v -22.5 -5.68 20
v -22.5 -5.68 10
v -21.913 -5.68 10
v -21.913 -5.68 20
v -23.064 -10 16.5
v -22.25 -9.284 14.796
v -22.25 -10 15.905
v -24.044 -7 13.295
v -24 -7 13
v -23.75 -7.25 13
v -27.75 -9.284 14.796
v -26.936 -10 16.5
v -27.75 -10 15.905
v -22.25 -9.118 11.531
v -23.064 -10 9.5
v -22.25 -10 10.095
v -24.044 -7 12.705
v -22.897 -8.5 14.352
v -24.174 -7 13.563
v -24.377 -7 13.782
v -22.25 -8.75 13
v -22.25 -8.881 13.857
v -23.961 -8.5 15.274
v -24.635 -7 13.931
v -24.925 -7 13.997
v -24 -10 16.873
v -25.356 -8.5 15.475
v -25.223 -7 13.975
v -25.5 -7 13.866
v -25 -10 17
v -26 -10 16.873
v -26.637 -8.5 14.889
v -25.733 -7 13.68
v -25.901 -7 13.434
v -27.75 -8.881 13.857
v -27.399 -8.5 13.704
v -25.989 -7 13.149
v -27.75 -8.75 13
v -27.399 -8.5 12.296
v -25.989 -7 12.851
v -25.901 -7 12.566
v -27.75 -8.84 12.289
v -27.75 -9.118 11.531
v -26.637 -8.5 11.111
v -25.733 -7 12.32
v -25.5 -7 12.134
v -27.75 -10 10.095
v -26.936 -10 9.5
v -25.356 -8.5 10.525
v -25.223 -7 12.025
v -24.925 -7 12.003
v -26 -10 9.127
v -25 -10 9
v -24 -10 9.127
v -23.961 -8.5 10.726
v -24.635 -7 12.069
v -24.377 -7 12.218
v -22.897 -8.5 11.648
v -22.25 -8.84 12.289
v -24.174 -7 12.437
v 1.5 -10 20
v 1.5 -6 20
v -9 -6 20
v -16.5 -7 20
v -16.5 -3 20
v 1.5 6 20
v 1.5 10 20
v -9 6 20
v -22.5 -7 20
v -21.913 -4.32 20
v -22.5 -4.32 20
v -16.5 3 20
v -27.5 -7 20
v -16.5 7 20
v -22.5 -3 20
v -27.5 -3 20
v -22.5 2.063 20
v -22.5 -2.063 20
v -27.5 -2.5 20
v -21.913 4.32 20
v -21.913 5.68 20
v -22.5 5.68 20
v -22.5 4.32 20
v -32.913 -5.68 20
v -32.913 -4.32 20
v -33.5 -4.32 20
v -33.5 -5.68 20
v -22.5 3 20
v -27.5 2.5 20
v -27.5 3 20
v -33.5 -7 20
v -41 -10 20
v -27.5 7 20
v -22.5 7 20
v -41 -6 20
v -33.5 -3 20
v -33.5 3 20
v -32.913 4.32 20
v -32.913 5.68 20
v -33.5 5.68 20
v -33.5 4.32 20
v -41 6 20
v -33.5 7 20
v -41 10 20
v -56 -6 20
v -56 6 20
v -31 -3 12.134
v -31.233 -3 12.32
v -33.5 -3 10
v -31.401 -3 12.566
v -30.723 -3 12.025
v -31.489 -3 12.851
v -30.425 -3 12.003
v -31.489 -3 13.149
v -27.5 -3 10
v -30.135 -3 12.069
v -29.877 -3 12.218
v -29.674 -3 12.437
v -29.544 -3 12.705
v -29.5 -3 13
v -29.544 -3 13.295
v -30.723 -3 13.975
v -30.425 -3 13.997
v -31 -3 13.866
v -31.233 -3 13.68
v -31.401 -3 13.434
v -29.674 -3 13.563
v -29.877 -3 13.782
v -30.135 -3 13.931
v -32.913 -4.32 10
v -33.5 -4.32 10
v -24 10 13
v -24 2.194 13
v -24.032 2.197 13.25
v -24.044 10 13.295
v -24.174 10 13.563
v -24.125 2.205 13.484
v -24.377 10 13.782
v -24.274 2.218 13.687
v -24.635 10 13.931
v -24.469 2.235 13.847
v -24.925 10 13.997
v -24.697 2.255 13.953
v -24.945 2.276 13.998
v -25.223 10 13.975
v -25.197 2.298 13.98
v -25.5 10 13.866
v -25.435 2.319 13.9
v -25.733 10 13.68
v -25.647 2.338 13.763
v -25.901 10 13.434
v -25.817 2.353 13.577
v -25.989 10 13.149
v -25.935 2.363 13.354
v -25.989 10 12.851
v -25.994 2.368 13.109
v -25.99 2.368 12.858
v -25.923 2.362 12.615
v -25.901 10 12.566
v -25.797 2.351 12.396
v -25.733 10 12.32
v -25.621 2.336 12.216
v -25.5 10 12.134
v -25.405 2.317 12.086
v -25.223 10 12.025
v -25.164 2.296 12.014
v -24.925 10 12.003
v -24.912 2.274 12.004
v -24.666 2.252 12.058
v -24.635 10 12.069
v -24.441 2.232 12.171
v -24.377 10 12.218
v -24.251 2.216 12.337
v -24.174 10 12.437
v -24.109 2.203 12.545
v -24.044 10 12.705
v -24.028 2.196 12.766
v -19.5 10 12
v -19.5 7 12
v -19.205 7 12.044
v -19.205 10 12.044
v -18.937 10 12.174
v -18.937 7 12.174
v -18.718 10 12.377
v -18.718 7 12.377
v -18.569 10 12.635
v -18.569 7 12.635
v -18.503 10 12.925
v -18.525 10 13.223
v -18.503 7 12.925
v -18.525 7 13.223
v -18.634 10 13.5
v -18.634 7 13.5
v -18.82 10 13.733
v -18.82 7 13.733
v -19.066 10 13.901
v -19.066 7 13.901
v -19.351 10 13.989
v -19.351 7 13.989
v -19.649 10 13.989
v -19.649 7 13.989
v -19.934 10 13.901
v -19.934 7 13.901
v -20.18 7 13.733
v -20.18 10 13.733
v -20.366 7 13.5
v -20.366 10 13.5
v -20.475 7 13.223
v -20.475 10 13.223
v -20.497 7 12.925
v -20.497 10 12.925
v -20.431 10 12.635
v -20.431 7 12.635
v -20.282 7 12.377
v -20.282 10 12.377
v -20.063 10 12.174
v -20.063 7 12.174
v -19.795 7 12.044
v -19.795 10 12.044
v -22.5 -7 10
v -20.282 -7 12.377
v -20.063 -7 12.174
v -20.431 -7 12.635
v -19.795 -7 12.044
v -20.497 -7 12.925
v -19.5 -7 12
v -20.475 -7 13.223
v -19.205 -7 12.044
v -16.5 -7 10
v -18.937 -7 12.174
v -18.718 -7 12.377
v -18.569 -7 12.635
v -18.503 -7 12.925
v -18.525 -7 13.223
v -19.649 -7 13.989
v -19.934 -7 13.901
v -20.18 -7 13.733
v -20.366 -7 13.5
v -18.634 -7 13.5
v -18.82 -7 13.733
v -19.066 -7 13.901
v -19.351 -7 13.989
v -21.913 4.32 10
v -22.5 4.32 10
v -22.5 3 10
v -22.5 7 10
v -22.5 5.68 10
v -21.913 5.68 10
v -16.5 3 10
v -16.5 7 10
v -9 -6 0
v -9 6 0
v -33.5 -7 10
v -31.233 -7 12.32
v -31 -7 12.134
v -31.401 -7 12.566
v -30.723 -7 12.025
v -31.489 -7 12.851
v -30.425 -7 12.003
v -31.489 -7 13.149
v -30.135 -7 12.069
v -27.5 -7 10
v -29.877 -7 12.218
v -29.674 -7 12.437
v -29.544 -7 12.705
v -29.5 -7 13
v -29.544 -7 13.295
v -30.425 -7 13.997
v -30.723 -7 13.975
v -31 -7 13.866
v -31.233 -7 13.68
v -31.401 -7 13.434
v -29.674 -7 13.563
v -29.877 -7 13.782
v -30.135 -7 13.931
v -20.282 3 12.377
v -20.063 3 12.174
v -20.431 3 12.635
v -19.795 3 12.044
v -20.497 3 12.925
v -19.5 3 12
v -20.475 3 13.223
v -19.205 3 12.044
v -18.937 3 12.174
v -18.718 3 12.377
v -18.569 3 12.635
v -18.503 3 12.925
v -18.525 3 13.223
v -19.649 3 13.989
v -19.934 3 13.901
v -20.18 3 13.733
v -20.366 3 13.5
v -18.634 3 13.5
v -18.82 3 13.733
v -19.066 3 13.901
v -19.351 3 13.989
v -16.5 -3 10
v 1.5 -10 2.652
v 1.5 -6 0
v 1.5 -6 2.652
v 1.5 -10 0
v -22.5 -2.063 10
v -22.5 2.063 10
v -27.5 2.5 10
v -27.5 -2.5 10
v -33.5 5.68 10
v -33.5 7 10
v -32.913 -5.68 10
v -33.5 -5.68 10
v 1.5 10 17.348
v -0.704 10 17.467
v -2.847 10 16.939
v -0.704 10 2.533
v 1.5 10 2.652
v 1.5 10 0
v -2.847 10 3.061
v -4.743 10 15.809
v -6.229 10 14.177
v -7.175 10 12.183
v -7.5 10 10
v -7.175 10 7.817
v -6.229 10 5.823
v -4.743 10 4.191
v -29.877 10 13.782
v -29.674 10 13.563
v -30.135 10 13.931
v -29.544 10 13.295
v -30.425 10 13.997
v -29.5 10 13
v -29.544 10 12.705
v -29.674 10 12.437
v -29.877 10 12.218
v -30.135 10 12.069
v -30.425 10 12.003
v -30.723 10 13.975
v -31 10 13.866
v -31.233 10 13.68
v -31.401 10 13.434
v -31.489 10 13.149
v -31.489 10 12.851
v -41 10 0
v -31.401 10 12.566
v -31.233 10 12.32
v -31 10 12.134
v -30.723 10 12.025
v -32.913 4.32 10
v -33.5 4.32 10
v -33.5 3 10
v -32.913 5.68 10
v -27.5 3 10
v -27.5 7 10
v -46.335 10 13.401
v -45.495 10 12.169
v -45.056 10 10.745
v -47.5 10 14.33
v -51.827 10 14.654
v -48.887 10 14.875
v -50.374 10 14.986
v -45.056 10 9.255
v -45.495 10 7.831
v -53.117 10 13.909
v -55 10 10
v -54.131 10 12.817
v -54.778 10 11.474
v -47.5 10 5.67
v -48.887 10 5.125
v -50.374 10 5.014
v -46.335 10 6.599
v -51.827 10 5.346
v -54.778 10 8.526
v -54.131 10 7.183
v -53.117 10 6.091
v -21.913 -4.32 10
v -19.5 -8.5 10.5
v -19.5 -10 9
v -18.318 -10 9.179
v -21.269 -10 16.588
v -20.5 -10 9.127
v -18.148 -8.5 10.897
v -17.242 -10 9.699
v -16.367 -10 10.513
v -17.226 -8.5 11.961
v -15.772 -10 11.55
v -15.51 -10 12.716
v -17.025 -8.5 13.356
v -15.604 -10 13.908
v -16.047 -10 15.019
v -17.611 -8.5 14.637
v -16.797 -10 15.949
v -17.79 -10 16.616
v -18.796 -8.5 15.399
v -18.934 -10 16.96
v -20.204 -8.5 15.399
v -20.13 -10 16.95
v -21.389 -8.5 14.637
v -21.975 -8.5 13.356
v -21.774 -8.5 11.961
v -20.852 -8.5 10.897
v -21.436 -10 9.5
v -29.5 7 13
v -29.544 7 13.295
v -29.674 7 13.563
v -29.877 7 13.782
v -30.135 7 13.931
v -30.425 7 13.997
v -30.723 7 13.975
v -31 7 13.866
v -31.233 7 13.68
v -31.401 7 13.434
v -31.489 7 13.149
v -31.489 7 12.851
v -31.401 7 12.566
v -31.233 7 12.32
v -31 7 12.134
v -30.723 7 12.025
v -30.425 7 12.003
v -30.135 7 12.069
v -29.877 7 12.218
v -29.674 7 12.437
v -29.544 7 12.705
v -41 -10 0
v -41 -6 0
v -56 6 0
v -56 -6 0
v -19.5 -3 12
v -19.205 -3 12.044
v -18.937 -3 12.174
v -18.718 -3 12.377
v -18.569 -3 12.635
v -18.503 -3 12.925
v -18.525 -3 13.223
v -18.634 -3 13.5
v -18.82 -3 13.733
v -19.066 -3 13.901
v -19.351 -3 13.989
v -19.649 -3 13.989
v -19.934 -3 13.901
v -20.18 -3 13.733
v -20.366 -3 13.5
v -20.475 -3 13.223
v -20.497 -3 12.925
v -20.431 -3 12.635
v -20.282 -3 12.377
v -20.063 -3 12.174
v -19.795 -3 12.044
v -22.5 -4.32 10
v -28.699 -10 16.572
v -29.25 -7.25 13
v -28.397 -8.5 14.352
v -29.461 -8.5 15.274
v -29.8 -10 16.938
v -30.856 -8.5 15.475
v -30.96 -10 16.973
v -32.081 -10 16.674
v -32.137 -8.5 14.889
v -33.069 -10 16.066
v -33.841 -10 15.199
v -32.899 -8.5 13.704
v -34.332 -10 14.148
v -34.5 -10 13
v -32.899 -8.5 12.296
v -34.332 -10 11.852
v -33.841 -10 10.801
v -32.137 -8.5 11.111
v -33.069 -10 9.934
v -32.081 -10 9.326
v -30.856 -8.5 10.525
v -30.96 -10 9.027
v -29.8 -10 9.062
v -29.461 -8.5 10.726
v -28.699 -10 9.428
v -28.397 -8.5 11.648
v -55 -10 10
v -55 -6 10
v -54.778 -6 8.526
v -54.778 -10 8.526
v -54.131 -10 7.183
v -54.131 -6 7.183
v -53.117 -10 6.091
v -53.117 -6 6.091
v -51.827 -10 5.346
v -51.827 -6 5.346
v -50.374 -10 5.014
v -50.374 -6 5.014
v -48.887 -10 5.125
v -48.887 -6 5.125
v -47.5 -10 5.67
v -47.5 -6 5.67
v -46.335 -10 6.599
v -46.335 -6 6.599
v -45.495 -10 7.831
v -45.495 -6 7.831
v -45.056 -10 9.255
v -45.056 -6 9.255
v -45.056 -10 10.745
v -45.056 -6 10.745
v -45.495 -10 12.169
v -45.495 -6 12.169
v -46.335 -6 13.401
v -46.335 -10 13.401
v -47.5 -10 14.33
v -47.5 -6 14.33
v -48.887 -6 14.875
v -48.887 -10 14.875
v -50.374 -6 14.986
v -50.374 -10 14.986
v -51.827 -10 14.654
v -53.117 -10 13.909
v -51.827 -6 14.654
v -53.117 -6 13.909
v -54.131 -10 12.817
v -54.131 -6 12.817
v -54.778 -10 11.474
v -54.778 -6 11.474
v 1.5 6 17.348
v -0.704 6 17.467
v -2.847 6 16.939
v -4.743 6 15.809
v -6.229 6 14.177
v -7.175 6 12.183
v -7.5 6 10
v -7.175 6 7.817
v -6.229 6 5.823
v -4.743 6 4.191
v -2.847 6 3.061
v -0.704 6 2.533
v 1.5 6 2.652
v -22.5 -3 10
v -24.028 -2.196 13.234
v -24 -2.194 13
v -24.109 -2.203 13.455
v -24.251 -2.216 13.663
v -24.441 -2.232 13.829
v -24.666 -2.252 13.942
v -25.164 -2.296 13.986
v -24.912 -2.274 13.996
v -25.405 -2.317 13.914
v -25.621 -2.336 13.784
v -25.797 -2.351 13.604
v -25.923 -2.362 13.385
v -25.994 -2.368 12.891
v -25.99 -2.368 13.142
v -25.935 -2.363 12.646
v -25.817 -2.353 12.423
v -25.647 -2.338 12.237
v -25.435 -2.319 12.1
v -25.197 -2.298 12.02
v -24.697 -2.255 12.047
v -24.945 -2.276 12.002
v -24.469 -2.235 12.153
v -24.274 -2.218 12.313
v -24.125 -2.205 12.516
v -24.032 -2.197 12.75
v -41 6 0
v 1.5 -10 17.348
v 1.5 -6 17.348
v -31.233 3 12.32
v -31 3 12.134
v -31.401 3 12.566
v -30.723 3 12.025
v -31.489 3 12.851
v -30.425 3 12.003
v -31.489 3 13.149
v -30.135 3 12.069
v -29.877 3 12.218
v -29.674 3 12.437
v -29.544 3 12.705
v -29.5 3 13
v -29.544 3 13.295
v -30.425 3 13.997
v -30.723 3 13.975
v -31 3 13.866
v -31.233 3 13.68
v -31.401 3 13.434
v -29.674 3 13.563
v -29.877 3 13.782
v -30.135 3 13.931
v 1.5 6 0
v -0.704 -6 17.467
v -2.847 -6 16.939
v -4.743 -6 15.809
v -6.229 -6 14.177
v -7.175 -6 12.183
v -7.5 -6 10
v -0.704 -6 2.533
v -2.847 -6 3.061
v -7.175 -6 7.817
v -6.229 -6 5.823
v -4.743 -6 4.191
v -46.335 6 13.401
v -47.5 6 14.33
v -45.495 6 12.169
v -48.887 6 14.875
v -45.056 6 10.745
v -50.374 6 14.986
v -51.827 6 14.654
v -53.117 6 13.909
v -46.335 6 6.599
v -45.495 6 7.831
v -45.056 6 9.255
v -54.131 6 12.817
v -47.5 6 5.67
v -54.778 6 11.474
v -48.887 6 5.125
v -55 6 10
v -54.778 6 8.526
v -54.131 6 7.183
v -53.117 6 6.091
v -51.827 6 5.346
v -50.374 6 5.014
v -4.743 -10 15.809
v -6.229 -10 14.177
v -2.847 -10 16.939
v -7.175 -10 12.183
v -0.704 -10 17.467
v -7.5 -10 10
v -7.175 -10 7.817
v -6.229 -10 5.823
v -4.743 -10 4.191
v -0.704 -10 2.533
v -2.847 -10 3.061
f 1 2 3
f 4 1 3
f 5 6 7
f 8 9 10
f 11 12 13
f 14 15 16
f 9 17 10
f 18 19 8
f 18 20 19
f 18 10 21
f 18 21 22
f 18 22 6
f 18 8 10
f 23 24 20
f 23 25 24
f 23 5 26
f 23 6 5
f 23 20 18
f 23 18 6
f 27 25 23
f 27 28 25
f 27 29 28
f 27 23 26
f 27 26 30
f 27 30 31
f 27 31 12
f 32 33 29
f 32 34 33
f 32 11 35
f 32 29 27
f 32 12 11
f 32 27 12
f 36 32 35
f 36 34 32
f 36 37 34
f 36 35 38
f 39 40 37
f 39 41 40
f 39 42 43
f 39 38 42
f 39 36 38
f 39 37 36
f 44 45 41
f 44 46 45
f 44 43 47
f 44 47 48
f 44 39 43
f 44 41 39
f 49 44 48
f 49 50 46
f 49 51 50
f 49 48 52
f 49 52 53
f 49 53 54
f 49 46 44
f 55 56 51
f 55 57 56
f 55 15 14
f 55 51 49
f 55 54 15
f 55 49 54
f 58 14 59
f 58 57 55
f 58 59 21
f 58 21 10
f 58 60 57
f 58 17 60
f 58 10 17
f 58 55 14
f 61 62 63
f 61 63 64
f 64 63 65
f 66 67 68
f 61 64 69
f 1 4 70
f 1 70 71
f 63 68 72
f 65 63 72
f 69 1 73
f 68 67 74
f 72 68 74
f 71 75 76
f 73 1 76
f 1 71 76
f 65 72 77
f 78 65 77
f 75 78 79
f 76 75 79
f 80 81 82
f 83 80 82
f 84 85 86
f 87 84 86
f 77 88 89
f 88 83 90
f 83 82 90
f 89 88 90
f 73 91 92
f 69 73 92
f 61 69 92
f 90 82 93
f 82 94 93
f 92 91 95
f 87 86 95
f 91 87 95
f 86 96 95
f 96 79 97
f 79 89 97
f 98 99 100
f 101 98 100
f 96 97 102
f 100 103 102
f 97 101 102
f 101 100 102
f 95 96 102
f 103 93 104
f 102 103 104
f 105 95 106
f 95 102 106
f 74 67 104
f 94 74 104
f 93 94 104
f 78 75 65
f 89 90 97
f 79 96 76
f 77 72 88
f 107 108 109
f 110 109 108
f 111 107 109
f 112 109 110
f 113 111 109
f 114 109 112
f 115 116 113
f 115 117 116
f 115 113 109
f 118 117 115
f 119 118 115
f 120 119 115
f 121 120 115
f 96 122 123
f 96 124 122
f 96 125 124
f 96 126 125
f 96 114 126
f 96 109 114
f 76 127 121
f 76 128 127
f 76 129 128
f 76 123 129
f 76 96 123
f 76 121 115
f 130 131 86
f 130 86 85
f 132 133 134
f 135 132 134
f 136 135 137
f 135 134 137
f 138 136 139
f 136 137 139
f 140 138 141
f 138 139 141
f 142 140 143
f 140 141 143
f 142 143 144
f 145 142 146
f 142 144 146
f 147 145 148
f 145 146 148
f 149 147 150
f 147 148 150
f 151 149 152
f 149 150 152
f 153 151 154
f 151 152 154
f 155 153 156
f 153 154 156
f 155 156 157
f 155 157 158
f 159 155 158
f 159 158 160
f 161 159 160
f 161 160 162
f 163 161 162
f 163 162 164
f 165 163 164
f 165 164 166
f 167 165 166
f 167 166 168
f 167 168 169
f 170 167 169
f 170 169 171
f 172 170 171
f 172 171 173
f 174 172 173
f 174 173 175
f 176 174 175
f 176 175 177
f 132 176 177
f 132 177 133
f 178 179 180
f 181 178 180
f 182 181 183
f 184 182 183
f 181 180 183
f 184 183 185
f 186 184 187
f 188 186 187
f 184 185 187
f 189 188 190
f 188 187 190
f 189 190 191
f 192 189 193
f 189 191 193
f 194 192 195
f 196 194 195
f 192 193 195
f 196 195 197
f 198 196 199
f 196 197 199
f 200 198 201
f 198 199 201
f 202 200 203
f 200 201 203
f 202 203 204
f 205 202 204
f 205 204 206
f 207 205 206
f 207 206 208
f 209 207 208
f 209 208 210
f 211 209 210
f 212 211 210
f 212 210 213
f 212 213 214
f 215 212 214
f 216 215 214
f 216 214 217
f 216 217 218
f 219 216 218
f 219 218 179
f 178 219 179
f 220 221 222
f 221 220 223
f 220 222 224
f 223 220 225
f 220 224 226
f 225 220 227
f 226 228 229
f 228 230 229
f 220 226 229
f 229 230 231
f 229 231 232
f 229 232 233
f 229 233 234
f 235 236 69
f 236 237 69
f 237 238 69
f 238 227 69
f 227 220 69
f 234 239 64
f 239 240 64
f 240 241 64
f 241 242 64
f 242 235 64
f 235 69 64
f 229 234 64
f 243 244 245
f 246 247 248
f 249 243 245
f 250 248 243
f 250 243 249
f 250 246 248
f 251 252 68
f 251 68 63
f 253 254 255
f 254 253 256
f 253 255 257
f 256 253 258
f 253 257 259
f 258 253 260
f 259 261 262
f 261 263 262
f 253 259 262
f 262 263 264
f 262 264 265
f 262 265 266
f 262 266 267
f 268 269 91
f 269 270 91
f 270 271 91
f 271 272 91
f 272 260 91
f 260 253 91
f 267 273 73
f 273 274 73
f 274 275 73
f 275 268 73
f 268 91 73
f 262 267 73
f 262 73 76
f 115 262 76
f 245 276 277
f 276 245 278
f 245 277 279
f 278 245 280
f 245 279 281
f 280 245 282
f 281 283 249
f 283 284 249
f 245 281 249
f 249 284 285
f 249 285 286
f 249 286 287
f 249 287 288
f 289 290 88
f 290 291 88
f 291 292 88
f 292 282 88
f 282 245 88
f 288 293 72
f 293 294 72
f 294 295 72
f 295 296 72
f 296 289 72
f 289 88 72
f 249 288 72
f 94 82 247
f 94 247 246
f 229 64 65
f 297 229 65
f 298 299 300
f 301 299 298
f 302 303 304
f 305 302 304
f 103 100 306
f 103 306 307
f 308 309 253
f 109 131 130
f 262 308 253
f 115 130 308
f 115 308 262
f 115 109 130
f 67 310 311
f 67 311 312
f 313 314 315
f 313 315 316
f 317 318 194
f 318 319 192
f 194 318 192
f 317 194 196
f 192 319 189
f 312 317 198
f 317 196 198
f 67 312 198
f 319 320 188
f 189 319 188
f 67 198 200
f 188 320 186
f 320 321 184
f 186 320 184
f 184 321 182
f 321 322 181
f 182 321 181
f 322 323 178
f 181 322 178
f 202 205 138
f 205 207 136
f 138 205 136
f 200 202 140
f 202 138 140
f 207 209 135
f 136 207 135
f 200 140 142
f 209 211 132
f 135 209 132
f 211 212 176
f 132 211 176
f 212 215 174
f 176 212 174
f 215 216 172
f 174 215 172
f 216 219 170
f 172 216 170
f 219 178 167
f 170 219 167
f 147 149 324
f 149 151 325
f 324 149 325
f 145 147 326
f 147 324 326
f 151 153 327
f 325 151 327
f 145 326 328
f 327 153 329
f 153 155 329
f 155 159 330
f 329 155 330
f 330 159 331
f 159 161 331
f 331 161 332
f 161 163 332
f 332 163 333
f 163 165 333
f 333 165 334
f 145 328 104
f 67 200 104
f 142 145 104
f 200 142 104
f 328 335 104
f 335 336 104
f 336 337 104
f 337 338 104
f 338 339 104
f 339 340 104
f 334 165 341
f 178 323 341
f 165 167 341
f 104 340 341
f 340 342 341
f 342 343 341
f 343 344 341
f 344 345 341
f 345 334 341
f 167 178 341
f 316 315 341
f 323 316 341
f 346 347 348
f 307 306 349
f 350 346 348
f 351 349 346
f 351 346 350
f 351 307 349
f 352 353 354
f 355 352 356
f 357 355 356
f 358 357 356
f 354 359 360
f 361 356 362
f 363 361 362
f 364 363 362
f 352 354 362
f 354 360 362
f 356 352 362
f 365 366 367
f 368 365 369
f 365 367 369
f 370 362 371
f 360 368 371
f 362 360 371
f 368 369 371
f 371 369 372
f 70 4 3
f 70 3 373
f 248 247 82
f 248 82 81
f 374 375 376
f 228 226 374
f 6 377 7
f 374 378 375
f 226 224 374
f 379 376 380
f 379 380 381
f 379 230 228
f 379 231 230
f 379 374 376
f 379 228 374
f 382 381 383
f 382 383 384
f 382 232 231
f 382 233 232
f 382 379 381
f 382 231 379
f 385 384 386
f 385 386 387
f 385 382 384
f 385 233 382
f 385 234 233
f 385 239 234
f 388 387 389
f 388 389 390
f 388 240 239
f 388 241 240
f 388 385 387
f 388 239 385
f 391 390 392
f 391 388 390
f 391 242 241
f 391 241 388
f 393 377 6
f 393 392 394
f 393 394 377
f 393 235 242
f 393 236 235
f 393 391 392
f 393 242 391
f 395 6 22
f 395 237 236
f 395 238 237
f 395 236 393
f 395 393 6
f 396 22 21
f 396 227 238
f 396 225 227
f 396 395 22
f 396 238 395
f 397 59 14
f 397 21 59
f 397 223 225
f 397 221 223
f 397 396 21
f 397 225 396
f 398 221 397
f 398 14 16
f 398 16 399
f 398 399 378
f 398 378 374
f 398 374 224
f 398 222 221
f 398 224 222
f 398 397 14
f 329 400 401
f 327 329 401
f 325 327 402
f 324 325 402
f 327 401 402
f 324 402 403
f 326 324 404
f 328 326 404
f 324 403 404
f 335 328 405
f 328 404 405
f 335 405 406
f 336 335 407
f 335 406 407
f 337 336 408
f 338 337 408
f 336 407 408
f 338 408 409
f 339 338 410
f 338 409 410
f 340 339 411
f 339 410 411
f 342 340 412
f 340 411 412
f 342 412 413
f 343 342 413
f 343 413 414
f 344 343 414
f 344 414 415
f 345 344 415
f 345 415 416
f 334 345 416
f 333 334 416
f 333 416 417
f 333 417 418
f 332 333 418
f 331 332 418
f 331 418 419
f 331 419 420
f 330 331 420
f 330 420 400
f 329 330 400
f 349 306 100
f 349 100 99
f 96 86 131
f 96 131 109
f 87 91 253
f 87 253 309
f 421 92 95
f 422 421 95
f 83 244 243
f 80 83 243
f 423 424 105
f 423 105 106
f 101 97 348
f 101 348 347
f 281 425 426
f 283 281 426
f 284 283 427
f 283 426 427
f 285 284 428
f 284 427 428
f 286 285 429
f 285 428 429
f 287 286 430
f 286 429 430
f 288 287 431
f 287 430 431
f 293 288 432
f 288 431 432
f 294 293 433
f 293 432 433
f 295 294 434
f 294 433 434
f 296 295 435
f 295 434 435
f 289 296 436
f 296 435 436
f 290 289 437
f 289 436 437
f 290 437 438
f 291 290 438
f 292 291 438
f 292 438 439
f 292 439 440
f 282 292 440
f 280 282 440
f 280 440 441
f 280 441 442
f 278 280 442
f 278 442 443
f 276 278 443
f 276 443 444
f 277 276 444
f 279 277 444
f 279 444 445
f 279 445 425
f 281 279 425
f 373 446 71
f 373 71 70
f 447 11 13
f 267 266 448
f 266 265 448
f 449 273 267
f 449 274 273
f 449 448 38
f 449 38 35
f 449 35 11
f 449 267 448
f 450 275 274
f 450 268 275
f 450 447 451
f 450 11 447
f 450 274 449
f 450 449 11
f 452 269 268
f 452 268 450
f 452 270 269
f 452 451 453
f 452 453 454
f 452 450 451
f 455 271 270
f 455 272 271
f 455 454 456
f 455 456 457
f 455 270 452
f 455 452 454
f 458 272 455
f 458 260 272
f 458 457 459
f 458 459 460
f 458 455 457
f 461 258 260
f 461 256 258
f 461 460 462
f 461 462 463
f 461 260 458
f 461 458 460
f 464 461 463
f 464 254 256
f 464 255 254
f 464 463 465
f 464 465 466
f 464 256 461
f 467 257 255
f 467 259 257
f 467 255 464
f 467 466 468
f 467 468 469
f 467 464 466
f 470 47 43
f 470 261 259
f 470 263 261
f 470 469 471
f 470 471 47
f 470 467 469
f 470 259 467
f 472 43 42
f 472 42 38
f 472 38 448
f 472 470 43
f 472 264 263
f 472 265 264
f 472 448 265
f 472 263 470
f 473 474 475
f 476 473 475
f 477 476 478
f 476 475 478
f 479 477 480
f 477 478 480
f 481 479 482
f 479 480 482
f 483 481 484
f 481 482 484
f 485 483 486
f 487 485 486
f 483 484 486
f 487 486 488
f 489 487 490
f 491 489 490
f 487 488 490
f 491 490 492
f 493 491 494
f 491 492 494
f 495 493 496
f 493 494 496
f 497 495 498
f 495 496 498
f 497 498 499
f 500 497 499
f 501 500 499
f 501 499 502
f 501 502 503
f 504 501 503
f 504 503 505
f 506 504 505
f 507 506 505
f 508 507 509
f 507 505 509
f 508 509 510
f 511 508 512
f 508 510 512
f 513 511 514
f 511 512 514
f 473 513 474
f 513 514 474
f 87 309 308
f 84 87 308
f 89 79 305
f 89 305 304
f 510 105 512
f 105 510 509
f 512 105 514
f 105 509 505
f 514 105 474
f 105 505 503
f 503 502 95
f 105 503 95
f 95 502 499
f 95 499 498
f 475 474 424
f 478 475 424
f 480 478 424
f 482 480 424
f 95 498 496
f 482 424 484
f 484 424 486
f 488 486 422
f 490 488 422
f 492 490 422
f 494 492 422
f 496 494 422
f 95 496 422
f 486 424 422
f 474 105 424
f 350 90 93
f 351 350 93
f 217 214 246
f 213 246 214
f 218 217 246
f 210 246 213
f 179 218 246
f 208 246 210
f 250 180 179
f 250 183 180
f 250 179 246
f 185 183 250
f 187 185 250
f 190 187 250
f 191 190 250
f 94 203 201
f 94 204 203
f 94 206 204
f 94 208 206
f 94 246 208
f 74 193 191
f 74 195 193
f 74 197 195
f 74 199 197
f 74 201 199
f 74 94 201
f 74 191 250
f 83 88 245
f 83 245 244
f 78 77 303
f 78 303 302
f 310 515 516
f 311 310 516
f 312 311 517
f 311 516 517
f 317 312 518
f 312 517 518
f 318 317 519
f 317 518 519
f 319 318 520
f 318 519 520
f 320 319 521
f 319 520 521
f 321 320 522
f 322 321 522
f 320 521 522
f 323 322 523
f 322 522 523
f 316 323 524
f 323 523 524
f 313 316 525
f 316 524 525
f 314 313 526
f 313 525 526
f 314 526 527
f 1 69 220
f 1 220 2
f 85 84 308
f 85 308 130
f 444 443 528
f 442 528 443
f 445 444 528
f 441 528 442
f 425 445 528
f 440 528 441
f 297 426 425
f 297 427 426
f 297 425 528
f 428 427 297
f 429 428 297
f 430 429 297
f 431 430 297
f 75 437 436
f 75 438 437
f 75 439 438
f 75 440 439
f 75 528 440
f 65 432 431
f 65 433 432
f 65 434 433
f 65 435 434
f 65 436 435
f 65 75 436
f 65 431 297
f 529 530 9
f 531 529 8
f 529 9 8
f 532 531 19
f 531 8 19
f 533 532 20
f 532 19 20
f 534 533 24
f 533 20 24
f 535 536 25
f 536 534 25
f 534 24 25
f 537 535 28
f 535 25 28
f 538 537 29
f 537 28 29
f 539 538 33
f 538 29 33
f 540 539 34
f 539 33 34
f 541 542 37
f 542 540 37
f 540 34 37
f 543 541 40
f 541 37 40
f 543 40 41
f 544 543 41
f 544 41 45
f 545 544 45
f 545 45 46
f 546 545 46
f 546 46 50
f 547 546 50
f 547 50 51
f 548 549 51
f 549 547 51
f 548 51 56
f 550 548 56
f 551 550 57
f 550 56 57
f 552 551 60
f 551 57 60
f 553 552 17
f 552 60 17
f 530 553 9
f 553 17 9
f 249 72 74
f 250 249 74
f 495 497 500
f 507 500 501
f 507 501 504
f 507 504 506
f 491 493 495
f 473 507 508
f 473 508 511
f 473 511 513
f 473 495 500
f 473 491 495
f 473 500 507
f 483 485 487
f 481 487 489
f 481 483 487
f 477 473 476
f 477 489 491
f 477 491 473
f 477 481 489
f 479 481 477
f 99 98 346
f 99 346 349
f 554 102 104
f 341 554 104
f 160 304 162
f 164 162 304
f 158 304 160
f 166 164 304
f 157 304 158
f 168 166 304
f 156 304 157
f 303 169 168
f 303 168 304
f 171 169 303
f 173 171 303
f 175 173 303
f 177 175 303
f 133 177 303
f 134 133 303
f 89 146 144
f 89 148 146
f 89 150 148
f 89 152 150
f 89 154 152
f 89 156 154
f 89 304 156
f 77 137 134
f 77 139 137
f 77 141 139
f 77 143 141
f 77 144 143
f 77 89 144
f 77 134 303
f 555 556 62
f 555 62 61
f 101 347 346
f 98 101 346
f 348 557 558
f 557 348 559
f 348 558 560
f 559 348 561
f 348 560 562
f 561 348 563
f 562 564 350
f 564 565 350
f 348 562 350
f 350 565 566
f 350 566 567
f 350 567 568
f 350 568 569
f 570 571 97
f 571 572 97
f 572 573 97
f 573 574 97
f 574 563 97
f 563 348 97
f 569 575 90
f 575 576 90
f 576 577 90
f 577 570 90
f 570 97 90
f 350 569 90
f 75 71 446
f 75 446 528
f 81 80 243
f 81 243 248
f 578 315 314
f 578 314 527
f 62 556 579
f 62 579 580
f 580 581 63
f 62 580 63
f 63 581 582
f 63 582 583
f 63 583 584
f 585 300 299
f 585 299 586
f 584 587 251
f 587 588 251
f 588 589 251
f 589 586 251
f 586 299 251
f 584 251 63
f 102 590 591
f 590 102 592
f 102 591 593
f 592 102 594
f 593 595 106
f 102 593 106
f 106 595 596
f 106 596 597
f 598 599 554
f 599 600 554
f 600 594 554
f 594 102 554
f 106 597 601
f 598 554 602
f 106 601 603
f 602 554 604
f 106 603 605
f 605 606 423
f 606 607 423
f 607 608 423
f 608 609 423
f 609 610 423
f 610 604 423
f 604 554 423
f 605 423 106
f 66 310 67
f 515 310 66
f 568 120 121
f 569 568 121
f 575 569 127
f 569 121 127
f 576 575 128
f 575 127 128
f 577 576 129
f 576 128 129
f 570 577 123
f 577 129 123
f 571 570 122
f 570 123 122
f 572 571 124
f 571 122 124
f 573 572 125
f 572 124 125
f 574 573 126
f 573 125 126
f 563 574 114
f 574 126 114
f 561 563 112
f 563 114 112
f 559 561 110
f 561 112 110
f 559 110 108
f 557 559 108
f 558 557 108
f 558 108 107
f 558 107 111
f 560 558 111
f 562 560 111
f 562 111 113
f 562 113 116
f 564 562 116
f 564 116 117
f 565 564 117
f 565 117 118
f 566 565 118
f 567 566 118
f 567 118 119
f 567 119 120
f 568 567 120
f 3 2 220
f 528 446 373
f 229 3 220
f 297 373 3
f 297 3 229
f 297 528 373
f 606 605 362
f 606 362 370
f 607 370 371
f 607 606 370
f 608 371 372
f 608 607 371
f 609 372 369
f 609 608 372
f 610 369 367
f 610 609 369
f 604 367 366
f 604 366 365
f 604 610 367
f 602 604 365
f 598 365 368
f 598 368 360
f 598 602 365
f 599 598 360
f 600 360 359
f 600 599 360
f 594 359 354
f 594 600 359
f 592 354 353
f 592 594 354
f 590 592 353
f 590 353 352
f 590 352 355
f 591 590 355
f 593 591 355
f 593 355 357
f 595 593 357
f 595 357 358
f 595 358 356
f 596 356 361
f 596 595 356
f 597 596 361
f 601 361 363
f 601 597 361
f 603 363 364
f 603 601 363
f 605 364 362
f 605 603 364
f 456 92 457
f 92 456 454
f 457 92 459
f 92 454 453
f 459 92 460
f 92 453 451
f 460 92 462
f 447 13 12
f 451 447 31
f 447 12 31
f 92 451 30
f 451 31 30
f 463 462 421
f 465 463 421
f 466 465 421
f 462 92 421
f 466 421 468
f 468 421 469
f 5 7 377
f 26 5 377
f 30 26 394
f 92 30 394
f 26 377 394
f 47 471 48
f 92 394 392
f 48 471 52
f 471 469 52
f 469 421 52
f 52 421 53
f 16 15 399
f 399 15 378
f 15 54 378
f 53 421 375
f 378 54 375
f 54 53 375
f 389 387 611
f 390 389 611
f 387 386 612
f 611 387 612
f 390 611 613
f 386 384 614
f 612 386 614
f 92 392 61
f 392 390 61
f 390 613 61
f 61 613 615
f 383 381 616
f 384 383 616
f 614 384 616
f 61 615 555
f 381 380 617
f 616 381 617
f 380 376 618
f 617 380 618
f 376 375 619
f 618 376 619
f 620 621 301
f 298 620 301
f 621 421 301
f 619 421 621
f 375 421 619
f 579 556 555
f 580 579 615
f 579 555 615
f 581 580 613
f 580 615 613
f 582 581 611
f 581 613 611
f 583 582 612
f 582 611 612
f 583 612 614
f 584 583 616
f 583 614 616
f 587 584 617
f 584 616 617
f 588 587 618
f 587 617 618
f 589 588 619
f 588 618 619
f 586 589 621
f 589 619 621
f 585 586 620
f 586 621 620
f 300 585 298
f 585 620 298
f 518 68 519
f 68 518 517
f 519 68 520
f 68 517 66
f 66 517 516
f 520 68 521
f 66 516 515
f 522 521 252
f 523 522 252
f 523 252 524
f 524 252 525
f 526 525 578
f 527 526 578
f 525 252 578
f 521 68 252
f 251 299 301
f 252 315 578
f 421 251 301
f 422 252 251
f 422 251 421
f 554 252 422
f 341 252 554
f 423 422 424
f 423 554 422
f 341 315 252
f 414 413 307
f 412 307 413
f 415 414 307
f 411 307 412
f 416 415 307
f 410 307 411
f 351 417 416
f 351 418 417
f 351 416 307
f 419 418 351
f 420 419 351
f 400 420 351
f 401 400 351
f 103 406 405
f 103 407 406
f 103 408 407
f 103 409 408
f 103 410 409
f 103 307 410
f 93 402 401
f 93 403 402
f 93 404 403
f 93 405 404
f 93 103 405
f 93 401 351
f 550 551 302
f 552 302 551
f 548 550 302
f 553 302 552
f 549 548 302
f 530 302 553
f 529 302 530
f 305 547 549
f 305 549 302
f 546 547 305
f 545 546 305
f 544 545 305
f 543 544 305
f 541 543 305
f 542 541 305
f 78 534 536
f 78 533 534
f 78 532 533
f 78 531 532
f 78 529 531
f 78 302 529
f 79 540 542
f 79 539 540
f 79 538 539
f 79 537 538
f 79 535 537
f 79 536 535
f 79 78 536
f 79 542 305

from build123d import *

# Parameters (mm, degrees)
BOSS_EXTRUDE1_DEPTH = 20
SKETCH2_R           = 5
BOSS_EXTRUDE2_DEPTH = 4
CUT_EXTRUDE1_REACH  = 64.738
SKETCH3_R           = 7.5
CUT_EXTRUDE2_DEPTH  = 10
SKETCH5_W           = 6
SKETCH5_H           = 4
CUT_EXTRUDE3_DEPTH  = 10
CUT_EXTRUDE4_REACH  = 64.738
SKETCH6_R           = 1
CHAMFER1_SIZE       = 3
SKETCH7_W           = 1.173916184
SKETCH7_H           = 1.359310186
BOSS_EXTRUDE3_DEPTH = 10


with BuildPart() as part:
    # Sketch1 → Boss-Extrude1 (new body)
    with BuildSketch(Plane.XY):
        Polygon((-41, -10), (-41, -6), (-50, -6), (-56, -6), (-56, 6), (-50, 6), (-41, 6), (-41, 10), (0, 10), (1.5, 10), (1.5, 6), (0, 6), (-9, 6), (-9, -6), (0, -6), (1.5, -6), (1.5, -10), (0, -10), align=None)
    extrude(amount=BOSS_EXTRUDE1_DEPTH)

    # Sketch2 → Boss-Extrude2 (add)
    with BuildSketch(Plane.XZ.offset(6)):
        with Locations(Location((-50, 10, 0), (0, 0, 180))):
            Circle(SKETCH2_R)
    boss_extrude2 = extrude(amount=BOSS_EXTRUDE2_DEPTH)

    # Cut-Extrude1: up to this face of the body (flat: up to its plane)
    cut_extrude1_end = Plane(part.part.faces().sort_by_distance((-19.75, 10, 10))[0])
    # Sketch3 → Cut-Extrude1 (cut, up to the picked face)
    with BuildSketch(Plane.XZ.offset(10), mode=Mode.PRIVATE) as cut_extrude1_sk1:
        with Locations((0, 10)):
            Circle(SKETCH3_R)
    cut_extrude1_tool1 = split(extrude(cut_extrude1_sk1.sketch, amount=-CUT_EXTRUDE1_REACH, mode=Mode.PRIVATE), bisect_by=cut_extrude1_end, keep=Keep.BOTH, mode=Mode.PRIVATE)
    add(cut_extrude1_tool1.solids().sort_by(Axis((0, -10, 10), (0, 1, 0)))[0], mode=Mode.SUBTRACT)

    # Mirror1: Boss-Extrude2 across plane
    add(boss_extrude2.mirror(Plane.ZX))

    # Sketch4 → Cut-Extrude2 (cut)
    with BuildSketch(Plane.XY.offset(20)):
        Polygon((-27.5, 2.5), (-22.5, 2.062556682), (-22.5, -2.062556682), (-27.5, -2.5), align=None)
    extrude(amount=-CUT_EXTRUDE2_DEPTH, mode=Mode.SUBTRACT)

    # Sketch5 → Cut-Extrude3 (cut)
    with BuildSketch(Plane.XY.offset(20)):
        with Locations((-30.5, 5)):
            Rectangle(SKETCH5_W, SKETCH5_H)
        with Locations((-19.5, 5)):
            Rectangle(SKETCH5_W, SKETCH5_H)
        with Locations((-19.5, -5)):
            Rectangle(SKETCH5_W, SKETCH5_H)
        with Locations((-30.5, -5)):
            Rectangle(SKETCH5_W, SKETCH5_H)
    extrude(amount=-CUT_EXTRUDE3_DEPTH, mode=Mode.SUBTRACT)

    # Cut-Extrude4: up to this face of the body (flat: up to its plane)
    cut_extrude4_end = Plane(part.part.faces().sort_by_distance((-22.349651974, 10, 10))[0])
    # Sketch6 → Cut-Extrude4 (cut, up to the picked face)
    with BuildSketch(Plane.XZ.offset(10), mode=Mode.PRIVATE) as cut_extrude4_sk1:
        with Locations((-30.5, 13)):
            Circle(SKETCH6_R)
    cut_extrude4_tool1 = split(extrude(cut_extrude4_sk1.sketch, amount=-CUT_EXTRUDE4_REACH, mode=Mode.PRIVATE), bisect_by=cut_extrude4_end, keep=Keep.BOTH, mode=Mode.PRIVATE)
    # Sketch6 → Cut-Extrude4 (cut, up to the picked face)
    with BuildSketch(Plane.XZ.offset(10), mode=Mode.PRIVATE) as cut_extrude4_sk2:
        with Locations((-25, 13)):
            Circle(SKETCH6_R)
    cut_extrude4_tool2 = split(extrude(cut_extrude4_sk2.sketch, amount=-CUT_EXTRUDE4_REACH, mode=Mode.PRIVATE), bisect_by=cut_extrude4_end, keep=Keep.BOTH, mode=Mode.PRIVATE)
    # Sketch6 → Cut-Extrude4 (cut, up to the picked face)
    with BuildSketch(Plane.XZ.offset(10), mode=Mode.PRIVATE) as cut_extrude4_sk3:
        with Locations(Location((-19.5, 13, 0), (0, 0, 270))):
            Circle(SKETCH6_R)
    cut_extrude4_tool3 = split(extrude(cut_extrude4_sk3.sketch, amount=-CUT_EXTRUDE4_REACH, mode=Mode.PRIVATE), bisect_by=cut_extrude4_end, keep=Keep.BOTH, mode=Mode.PRIVATE)
    add(cut_extrude4_tool1.solids().sort_by(Axis((-30.5, -10, 13), (0, 1, 0)))[0], mode=Mode.SUBTRACT)
    add(cut_extrude4_tool2.solids().sort_by(Axis((-25, -10, 13), (0, 1, 0)))[0], mode=Mode.SUBTRACT)
    add(cut_extrude4_tool3.solids().sort_by(Axis((-19.5, -10, 13), (0, 1, 0)))[0], mode=Mode.SUBTRACT)

    # Chamfer1
    # the kernel refuses this chamfer: 3 mm, written as the material it takes off along each edge
    with BuildSketch(Plane(origin=(-30.5, -10, 13), x_dir=(1, 0, 0), z_dir=(0, 0, -1))) as chamfer1_piece_1:
        Polygon((1 + CHAMFER1_SIZE, 0), (1, -CHAMFER1_SIZE), (1, 0), align=None)
    revolve(axis=Axis((-30.5, -10, 13), (0, -1, 0)), mode=Mode.SUBTRACT)
    with BuildSketch(Plane(origin=(-25, -10, 13), x_dir=(1, 0, 0), z_dir=(0, 0, -1))) as chamfer1_piece_2:
        Polygon((1 + CHAMFER1_SIZE, 0), (1, -CHAMFER1_SIZE), (1, 0), align=None)
    revolve(axis=Axis((-25, -10, 13), (0, -1, 0)), mode=Mode.SUBTRACT)
    with BuildSketch(Plane(origin=(-19.5, -10, 13), x_dir=(0, 0, -1), z_dir=(-1, 0, 0))) as chamfer1_piece_3:
        Polygon((1 + CHAMFER1_SIZE, 0), (1, -CHAMFER1_SIZE), (1, 0), align=None)
    revolve(axis=Axis((-19.5, -10, 13), (0, -1, 0)), mode=Mode.SUBTRACT)

    # Sketch7 → Boss-Extrude3 (add)
    with BuildSketch(Plane.XY.offset(20)):
        with Locations((-22.5, -5)):
            Rectangle(SKETCH7_W, SKETCH7_H)
        with Locations((-33.5, -5)):
            Rectangle(SKETCH7_W, SKETCH7_H)
        with Locations((-33.5, 5)):
            Rectangle(SKETCH7_W, SKETCH7_H)
        with Locations((-22.5, 5)):
            Rectangle(SKETCH7_W, SKETCH7_H)
    extrude(amount=-BOSS_EXTRUDE3_DEPTH)


solid = part.part
